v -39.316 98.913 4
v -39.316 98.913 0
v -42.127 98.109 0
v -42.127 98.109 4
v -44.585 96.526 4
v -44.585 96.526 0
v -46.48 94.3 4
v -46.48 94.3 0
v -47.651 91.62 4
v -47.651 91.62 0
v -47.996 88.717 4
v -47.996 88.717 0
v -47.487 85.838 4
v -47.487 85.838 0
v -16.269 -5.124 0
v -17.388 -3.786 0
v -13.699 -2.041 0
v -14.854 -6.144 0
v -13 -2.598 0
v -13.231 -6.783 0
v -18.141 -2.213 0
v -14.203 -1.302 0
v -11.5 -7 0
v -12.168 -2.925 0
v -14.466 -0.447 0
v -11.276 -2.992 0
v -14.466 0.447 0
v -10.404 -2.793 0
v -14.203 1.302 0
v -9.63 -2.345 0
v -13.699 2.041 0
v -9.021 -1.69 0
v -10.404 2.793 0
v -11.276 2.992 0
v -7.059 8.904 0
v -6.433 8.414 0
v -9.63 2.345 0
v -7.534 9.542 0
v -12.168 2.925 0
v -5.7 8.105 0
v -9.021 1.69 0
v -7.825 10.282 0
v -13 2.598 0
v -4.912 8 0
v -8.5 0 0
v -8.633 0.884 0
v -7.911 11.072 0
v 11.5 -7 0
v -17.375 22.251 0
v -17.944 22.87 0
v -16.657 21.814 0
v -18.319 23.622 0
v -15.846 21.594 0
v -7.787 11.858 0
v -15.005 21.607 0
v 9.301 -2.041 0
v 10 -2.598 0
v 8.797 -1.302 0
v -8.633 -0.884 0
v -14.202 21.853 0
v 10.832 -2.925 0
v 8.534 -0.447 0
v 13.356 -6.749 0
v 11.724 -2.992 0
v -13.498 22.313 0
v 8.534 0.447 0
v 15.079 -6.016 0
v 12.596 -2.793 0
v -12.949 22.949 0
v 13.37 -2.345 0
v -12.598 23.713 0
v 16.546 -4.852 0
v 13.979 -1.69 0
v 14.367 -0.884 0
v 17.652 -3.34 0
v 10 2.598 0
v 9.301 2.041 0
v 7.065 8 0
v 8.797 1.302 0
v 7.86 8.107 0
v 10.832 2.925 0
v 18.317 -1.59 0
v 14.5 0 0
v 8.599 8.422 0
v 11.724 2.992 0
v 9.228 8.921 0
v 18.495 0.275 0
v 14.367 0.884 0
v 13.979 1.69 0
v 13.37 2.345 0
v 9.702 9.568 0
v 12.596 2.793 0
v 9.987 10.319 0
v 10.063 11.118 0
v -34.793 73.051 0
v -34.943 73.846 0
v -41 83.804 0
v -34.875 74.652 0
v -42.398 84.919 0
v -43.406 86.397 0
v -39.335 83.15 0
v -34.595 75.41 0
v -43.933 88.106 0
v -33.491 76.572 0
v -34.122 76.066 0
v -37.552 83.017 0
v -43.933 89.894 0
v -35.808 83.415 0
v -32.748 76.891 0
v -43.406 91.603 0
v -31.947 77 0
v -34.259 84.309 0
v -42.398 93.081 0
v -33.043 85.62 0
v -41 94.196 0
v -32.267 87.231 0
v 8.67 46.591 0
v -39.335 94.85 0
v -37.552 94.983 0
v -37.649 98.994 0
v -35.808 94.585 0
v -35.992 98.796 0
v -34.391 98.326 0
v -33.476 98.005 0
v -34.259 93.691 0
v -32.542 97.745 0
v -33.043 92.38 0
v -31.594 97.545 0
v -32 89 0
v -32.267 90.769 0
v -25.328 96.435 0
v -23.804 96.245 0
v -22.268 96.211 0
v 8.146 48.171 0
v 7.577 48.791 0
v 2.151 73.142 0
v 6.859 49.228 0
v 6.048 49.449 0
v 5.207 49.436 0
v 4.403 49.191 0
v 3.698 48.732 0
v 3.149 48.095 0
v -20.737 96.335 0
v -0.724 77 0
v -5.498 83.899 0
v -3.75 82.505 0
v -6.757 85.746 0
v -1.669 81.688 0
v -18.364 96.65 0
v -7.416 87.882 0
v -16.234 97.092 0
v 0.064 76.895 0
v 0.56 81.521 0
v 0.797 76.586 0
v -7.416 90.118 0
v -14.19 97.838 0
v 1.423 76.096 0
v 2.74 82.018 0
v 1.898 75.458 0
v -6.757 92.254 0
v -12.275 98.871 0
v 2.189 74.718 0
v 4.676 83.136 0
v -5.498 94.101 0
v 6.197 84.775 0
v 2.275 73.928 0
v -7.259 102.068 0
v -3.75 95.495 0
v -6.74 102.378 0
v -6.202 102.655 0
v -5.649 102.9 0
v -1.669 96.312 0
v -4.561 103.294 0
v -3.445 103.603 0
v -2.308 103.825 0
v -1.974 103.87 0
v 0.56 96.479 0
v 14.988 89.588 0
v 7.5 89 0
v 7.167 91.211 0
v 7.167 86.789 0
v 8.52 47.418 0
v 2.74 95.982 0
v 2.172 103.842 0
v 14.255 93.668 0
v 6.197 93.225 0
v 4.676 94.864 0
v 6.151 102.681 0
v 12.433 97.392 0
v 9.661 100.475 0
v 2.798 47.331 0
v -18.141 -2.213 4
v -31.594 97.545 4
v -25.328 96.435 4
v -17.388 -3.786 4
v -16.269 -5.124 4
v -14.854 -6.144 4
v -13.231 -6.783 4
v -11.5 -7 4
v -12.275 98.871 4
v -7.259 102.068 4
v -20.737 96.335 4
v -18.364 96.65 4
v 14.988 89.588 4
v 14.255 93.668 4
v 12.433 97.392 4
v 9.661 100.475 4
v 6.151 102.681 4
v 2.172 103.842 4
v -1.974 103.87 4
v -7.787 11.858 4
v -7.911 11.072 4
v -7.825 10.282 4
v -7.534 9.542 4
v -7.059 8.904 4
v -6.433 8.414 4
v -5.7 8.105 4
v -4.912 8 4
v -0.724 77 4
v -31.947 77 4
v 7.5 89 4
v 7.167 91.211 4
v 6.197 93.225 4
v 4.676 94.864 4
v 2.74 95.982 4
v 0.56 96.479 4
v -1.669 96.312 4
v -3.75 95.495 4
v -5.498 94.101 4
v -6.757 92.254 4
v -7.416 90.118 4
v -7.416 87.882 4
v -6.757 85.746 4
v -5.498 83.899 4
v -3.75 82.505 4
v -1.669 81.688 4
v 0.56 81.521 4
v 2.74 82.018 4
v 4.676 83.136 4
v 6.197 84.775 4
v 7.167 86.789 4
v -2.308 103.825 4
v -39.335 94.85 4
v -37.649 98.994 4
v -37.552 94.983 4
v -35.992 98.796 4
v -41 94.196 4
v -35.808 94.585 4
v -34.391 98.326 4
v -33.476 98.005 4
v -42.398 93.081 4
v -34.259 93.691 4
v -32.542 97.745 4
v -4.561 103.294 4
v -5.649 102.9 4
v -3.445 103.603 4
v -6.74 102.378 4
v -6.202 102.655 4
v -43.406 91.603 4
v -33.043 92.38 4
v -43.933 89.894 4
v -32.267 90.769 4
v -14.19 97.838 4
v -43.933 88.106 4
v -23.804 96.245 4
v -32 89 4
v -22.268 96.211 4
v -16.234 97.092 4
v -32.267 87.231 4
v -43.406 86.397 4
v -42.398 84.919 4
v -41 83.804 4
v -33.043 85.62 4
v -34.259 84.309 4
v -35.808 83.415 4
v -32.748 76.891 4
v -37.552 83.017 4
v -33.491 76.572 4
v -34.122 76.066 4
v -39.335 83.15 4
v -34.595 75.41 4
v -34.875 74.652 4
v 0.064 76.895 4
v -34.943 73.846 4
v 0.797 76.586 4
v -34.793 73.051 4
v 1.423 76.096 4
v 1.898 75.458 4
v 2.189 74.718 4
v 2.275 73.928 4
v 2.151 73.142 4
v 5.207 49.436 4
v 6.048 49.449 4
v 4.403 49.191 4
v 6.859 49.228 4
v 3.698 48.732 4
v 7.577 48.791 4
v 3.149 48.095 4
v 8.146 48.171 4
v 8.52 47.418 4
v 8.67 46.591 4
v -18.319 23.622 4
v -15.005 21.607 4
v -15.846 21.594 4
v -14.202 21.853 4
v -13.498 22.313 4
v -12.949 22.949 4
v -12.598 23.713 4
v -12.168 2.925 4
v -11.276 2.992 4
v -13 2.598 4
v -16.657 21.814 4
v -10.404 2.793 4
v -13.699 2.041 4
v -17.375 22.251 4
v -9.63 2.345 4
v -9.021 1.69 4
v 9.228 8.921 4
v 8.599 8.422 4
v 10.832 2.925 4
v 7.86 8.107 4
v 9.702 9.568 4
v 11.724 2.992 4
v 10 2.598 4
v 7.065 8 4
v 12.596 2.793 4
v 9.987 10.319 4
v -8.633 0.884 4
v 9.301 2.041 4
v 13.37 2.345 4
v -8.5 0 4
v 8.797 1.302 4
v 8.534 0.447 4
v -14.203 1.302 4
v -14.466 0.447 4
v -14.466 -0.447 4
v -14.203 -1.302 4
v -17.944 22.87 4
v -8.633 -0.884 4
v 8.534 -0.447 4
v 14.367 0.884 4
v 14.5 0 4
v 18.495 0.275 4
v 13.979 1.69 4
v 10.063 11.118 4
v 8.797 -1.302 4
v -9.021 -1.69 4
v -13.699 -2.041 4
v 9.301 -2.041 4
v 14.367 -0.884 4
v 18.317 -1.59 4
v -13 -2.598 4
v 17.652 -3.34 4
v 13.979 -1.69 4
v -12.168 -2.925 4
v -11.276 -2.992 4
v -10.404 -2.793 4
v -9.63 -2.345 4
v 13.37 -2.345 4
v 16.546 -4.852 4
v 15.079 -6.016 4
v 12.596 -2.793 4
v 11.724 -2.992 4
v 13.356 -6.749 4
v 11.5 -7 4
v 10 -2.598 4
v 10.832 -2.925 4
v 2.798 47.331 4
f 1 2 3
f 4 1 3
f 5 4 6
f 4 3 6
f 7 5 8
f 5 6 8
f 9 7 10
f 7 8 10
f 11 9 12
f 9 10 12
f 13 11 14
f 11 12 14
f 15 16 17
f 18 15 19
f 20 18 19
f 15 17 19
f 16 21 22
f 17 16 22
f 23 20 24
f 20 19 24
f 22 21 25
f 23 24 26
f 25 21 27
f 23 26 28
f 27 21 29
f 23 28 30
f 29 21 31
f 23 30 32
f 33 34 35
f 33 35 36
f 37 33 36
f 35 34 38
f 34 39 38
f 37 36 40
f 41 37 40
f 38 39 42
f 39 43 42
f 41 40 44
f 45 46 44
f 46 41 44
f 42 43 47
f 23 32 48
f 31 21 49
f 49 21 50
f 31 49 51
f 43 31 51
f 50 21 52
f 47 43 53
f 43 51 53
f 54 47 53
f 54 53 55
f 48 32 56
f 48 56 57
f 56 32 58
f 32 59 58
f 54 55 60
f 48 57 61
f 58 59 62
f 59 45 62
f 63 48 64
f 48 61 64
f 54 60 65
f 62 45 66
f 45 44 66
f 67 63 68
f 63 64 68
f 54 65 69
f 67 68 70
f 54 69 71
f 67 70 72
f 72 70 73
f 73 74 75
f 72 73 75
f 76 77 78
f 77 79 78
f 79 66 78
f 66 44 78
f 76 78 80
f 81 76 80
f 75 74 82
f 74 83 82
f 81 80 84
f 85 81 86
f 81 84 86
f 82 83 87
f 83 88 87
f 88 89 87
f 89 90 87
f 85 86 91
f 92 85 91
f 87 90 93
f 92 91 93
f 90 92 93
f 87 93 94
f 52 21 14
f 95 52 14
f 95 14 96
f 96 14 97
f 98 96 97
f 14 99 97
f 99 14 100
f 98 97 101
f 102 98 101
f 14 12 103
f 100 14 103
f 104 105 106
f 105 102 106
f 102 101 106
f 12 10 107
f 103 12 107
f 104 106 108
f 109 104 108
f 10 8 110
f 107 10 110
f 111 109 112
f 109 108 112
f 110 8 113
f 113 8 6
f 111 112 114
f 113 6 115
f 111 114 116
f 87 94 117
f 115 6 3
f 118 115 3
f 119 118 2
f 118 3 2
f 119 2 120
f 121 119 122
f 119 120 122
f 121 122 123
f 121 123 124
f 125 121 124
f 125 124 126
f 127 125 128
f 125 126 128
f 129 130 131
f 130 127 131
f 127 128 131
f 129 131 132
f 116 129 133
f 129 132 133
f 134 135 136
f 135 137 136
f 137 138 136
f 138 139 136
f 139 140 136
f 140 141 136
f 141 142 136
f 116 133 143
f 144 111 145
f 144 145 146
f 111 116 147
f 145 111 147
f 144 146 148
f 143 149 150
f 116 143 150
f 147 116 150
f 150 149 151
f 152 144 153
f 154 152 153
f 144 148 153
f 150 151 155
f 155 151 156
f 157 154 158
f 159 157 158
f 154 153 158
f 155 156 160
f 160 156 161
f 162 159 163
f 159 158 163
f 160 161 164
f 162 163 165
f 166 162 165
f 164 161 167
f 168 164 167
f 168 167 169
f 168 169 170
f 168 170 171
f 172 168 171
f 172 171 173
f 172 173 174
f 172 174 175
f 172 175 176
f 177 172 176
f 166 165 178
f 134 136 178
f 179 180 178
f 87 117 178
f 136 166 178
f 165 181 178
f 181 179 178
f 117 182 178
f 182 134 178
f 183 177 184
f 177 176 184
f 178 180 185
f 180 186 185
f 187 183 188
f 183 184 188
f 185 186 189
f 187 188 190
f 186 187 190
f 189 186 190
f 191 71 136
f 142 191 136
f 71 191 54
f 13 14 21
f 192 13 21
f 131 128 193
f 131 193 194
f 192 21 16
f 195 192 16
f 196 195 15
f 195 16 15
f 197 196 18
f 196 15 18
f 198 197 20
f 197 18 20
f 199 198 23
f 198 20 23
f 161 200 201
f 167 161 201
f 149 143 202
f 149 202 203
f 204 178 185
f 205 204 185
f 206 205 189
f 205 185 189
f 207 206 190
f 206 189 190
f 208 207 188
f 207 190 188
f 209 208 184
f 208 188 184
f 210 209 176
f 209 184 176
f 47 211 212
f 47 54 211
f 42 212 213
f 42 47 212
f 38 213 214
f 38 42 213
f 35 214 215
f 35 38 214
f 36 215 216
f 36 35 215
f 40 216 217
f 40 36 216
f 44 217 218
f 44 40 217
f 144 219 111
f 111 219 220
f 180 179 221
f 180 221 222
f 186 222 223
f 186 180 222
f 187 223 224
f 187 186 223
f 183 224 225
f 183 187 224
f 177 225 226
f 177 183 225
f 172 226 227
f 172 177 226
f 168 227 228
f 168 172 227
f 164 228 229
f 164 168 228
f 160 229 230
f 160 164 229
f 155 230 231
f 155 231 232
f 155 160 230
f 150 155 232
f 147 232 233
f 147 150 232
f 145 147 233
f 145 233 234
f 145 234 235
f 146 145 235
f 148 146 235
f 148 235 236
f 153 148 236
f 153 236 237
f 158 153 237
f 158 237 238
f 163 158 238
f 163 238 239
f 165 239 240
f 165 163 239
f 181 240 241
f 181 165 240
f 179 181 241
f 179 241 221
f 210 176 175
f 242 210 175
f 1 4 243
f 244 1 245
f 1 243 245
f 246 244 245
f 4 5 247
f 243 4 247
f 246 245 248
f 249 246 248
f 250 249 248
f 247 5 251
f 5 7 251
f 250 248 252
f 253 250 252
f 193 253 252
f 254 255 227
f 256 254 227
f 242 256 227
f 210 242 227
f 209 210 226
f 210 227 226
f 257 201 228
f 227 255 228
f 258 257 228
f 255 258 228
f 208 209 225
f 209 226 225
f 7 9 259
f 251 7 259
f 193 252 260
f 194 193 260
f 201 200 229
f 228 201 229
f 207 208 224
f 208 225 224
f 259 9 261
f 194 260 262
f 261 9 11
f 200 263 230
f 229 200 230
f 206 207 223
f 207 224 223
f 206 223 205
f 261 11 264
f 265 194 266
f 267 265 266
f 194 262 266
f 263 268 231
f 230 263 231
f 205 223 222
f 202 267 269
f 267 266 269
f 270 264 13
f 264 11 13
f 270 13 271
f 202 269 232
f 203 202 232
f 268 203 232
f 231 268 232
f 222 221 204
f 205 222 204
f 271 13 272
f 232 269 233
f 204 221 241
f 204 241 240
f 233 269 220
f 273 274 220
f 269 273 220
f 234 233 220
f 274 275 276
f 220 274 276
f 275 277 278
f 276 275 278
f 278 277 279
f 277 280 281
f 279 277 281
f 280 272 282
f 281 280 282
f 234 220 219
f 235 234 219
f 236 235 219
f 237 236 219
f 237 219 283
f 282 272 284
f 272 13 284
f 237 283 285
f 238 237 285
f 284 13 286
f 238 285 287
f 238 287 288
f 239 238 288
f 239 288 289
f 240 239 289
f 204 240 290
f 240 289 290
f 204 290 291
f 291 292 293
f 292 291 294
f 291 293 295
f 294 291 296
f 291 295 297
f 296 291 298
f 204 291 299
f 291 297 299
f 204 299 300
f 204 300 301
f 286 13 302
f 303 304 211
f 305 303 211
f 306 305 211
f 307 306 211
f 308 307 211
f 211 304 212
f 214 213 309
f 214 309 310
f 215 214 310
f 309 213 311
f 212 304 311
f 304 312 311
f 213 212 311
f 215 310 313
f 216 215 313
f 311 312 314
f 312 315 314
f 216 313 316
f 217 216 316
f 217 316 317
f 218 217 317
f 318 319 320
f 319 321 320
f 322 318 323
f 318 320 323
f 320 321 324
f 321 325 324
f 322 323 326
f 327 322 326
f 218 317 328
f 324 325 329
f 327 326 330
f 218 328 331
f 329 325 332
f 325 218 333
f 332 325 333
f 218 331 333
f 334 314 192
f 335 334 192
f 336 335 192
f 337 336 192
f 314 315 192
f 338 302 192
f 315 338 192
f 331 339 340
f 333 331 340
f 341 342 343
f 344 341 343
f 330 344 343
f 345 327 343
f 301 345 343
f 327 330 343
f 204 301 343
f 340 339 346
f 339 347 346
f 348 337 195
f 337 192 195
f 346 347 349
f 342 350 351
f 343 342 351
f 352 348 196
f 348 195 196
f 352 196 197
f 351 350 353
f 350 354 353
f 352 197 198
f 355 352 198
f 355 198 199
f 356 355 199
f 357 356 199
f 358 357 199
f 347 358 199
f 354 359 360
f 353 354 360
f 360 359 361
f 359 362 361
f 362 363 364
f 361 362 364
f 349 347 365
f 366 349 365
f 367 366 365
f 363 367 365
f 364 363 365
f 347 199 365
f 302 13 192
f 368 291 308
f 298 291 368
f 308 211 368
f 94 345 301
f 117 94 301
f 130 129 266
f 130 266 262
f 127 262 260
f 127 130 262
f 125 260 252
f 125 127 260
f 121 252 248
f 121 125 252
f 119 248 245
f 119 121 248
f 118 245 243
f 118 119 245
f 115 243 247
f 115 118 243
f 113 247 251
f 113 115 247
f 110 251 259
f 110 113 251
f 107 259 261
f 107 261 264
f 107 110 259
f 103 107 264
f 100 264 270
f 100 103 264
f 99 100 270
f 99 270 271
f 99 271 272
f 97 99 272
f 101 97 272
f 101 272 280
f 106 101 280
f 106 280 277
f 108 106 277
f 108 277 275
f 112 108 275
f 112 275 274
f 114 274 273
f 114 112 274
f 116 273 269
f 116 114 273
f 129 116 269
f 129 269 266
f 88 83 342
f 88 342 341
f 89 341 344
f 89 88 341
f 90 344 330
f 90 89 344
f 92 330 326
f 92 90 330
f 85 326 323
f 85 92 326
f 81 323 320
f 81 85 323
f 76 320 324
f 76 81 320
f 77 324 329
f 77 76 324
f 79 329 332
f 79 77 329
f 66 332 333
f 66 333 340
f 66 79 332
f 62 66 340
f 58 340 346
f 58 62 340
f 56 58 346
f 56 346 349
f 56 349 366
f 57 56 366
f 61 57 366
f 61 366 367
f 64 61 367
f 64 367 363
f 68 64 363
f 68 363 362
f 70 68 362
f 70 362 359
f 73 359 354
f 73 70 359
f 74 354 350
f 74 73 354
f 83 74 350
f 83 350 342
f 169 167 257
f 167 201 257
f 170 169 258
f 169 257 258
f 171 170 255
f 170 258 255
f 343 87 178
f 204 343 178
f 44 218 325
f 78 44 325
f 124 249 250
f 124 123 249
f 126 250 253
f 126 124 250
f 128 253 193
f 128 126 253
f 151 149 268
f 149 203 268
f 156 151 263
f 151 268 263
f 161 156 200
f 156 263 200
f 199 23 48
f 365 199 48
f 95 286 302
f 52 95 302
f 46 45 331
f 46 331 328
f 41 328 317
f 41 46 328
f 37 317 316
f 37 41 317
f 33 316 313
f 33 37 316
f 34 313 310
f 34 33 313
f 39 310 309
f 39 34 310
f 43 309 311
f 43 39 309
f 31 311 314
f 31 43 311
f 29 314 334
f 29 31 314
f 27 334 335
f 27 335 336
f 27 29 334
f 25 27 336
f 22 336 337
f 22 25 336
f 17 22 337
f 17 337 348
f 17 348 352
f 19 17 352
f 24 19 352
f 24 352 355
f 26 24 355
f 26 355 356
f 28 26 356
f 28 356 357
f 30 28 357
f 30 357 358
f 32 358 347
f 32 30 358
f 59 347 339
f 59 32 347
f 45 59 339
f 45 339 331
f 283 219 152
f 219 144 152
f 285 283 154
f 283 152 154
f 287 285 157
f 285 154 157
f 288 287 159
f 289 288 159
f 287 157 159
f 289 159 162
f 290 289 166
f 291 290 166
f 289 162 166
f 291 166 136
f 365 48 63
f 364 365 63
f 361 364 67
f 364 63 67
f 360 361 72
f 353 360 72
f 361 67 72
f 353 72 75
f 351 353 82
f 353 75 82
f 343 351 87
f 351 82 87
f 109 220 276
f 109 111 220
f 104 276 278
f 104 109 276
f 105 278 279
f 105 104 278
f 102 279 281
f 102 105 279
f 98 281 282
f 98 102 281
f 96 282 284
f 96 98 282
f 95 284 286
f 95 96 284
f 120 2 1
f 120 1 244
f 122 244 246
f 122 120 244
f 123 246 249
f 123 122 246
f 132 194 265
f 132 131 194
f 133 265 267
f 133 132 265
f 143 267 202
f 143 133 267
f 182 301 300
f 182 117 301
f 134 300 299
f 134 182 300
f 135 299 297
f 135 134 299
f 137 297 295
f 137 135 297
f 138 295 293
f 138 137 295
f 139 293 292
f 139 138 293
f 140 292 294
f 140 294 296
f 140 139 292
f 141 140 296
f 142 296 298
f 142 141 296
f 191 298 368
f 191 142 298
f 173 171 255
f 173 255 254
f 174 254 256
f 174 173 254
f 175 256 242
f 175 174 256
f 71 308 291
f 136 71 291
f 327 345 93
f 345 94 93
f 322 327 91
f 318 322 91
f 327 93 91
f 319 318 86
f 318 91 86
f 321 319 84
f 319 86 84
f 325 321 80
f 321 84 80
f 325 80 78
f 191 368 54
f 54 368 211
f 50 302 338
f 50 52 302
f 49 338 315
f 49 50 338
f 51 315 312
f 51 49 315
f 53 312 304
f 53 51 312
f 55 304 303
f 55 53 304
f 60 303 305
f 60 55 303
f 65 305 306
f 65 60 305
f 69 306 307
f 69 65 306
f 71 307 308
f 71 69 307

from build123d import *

# Parameters (mm, degrees)
SKETCH_1_R            = 3
SKETCH_1_R_2          = 7.5
SKETCH_1_R_3          = 6
EXTRUDE_1_DEPTH       = 4
CUT_EXTRUDE_START     = -10
CUT_EXTRUDE_2_DEPTH   = 10
CHAMFER_START         = -90.054290201
CHAMFER_2_OUTLINE_W   = 9.93243638
CHAMFER_2_OUTLINE_H   = 4
CHAMFER_2_DEPTH       = 0.082131492
CHAMFER_START_2       = -89.972158709
CHAMFER_2_2_OUTLINE_W = 9.93243638
CHAMFER_2_2_OUTLINE_H = 4
CHAMFER_2_2_DEPTH     = 1.179418362
FILLET_4_R            = 15
FILLET_5_R            = 10
CUT_EXTRUDE_6_DEPTH   = 10
FILLET_8_R            = 3


with BuildPart() as part:
    # 草图1 → 凸台-拉伸1 (new body)
    with BuildSketch(Plane.XY):
        with BuildLine():
            Line((-47.486974837, 85.838147942), (-18.140882386, -2.213296441))
            ThreePointArc((-18.140882386, -2.213296441), (-15.593099371, -5.678603485), (-11.5, -7))
            Line((-11.5, -7), (11.5, -7))
            ThreePointArc((11.5, -7), (16.545894038, -4.851695926), (18.494612442, 0.274584754))
            Line((18.494612442, 0.274584754), (14.988455233, 89.588395901))
            ThreePointArc((14.988455233, 89.588395901), (9.660960601, 100.474573642), (-1.973684211, 103.869585423))
            Line((-1.973684211, 103.869585423), (-39.315789474, 98.913056948))
            ThreePointArc((-39.315789474, 98.913056948), (-46.480167485, 94.299694277), (-47.486974837, 85.838147942))
        make_face()
        with Locations((11.5, 0)):
            Circle(SKETCH_1_R, mode=Mode.SUBTRACT)
        with Locations((-11.5, 0)):
            Circle(SKETCH_1_R, mode=Mode.SUBTRACT)
        with Locations((0, 89)):
            Circle(SKETCH_1_R_2, mode=Mode.SUBTRACT)
        with Locations((-38, 89)):
            Circle(SKETCH_1_R_3, mode=Mode.SUBTRACT)
    extrude(amount=EXTRUDE_1_DEPTH)

    # 草图3 → 切除-拉伸2 (cut)
    with BuildSketch(Plane.XY.offset(4).offset(CUT_EXTRUDE_START)):
        with BuildLine():
            Line((-30.07293559, 95.096035584), (-12.403974557, 97.441289229))
            ThreePointArc((-12.403974557, 97.441289229), (-8.018810771, 101.681191682), (-2.308312161, 103.825169261))
            Line((-2.308312161, 103.825169261), (-39.315789474, 98.913056948))
            ThreePointArc((-39.315789474, 98.913056948), (-34.182978636, 98.242853883), (-30.07293559, 95.096035584))
        make_face()
    extrude(amount=CUT_EXTRUDE_2_DEPTH, mode=Mode.SUBTRACT)

    # 倒角1
    # the kernel refuses this chamfer: 10 mm, written as the material it adds along each edge
    with BuildSketch(Plane(origin=(-30.07293559, 95.096035584, 0), x_dir=(-0.7655170404951253, 0.6434156205063604, 0), z_dir=(0, 0, 1))) as chamfer_1_piece_1:
        with BuildLine():
            Line((4.638446898, 0.2), (-5.12937843, -5.439456583))
            Line((-5.12937843, -5.439456583), (-5.277087929, -5.304616293))
            ThreePointArc((-5.277087929, -5.304616293), (-2.667716566, -2.625677211), (-0.147709499, 0.13484029))
            Line((-0.147709499, 0.13484029), (0.042920367, 0.195340324))
            ThreePointArc((0.042920367, 0.195340324), (2.321577959, -0.03141118), (4.595526531, 0.395340324))
            Line((4.595526531, 0.395340324), (4.638446898, 0.2))
        make_face()
    extrude(amount=4)

    # 倒角2: read off the stored shape, not the designer's step
    # 倒角2 outline → 倒角2 (cut)
    with BuildSketch(Plane(origin=(0, 0, 0), x_dir=(0.8432639594677478, 0.5374996694536441, 0), z_dir=(0.537499669453644, -0.8432639594677479, 0)).offset(CHAMFER_START)):
        with Locations((44.438996955, 2)):
            Rectangle(CHAMFER_2_OUTLINE_W, CHAMFER_2_OUTLINE_H)
    extrude(amount=CHAMFER_2_DEPTH, mode=Mode.SUBTRACT)

    # Chamfer 2 2 outline → Chamfer 2 2 (add)
    with BuildSketch(Plane(origin=(0, 0, 0), x_dir=(0.8432639594677478, 0.5374996694536441, 0), z_dir=(0.537499669453644, -0.8432639594677479, 0)).offset(CHAMFER_START_2)):
        with Locations((44.438996955, 2)):
            Rectangle(CHAMFER_2_2_OUTLINE_W, CHAMFER_2_2_OUTLINE_H)
    extrude(amount=CHAMFER_2_2_DEPTH)

    # 圆角4
    fillet_4_edges = [part.edges().sort_by_distance(p)[0] for p in [
        (-23.040343668, 96.029492385, 2),
        (-33.358562851, 97.857599065, 2),
        (-15.074033854, 97.086884333, 2),
    ]]
    fillet(fillet_4_edges, radius=FILLET_4_R)

    # 圆角5
    fillet_5_edges = [part.edges().sort_by_distance(p)[0] for p in [
        (-6.698368225, 102.425565605, 2),
    ]]
    fillet(fillet_5_edges, radius=FILLET_5_R)

    # 草图7 → 切除-拉伸6 (cut)
    with BuildSketch(Plane.XY.offset(4)):
        Polygon((3.302198464, 77), (-36.108751735, 77), (-15.314632791, 14.608313246), align=None)
        Polygon((10.185176898, 8), (7.961799494, 64.637023864), (-8.937918575, 8), align=None)
    extrude(amount=-CUT_EXTRUDE_6_DEPTH, mode=Mode.SUBTRACT)

    # 圆角8
    fillet_8_edges = [part.edges().sort_by_distance(p)[0] for p in [
        (7.961799494, 64.637023864, 2),
        (10.185176898, 8, 2),
        (-8.937918575, 8, 2),
        (3.302198464, 77, 2),
        (-15.314632791, 14.608313246, 2),
        (-36.108751735, 77, 2),
    ]]
    fillet(fillet_8_edges, radius=FILLET_8_R)


solid = part.part
